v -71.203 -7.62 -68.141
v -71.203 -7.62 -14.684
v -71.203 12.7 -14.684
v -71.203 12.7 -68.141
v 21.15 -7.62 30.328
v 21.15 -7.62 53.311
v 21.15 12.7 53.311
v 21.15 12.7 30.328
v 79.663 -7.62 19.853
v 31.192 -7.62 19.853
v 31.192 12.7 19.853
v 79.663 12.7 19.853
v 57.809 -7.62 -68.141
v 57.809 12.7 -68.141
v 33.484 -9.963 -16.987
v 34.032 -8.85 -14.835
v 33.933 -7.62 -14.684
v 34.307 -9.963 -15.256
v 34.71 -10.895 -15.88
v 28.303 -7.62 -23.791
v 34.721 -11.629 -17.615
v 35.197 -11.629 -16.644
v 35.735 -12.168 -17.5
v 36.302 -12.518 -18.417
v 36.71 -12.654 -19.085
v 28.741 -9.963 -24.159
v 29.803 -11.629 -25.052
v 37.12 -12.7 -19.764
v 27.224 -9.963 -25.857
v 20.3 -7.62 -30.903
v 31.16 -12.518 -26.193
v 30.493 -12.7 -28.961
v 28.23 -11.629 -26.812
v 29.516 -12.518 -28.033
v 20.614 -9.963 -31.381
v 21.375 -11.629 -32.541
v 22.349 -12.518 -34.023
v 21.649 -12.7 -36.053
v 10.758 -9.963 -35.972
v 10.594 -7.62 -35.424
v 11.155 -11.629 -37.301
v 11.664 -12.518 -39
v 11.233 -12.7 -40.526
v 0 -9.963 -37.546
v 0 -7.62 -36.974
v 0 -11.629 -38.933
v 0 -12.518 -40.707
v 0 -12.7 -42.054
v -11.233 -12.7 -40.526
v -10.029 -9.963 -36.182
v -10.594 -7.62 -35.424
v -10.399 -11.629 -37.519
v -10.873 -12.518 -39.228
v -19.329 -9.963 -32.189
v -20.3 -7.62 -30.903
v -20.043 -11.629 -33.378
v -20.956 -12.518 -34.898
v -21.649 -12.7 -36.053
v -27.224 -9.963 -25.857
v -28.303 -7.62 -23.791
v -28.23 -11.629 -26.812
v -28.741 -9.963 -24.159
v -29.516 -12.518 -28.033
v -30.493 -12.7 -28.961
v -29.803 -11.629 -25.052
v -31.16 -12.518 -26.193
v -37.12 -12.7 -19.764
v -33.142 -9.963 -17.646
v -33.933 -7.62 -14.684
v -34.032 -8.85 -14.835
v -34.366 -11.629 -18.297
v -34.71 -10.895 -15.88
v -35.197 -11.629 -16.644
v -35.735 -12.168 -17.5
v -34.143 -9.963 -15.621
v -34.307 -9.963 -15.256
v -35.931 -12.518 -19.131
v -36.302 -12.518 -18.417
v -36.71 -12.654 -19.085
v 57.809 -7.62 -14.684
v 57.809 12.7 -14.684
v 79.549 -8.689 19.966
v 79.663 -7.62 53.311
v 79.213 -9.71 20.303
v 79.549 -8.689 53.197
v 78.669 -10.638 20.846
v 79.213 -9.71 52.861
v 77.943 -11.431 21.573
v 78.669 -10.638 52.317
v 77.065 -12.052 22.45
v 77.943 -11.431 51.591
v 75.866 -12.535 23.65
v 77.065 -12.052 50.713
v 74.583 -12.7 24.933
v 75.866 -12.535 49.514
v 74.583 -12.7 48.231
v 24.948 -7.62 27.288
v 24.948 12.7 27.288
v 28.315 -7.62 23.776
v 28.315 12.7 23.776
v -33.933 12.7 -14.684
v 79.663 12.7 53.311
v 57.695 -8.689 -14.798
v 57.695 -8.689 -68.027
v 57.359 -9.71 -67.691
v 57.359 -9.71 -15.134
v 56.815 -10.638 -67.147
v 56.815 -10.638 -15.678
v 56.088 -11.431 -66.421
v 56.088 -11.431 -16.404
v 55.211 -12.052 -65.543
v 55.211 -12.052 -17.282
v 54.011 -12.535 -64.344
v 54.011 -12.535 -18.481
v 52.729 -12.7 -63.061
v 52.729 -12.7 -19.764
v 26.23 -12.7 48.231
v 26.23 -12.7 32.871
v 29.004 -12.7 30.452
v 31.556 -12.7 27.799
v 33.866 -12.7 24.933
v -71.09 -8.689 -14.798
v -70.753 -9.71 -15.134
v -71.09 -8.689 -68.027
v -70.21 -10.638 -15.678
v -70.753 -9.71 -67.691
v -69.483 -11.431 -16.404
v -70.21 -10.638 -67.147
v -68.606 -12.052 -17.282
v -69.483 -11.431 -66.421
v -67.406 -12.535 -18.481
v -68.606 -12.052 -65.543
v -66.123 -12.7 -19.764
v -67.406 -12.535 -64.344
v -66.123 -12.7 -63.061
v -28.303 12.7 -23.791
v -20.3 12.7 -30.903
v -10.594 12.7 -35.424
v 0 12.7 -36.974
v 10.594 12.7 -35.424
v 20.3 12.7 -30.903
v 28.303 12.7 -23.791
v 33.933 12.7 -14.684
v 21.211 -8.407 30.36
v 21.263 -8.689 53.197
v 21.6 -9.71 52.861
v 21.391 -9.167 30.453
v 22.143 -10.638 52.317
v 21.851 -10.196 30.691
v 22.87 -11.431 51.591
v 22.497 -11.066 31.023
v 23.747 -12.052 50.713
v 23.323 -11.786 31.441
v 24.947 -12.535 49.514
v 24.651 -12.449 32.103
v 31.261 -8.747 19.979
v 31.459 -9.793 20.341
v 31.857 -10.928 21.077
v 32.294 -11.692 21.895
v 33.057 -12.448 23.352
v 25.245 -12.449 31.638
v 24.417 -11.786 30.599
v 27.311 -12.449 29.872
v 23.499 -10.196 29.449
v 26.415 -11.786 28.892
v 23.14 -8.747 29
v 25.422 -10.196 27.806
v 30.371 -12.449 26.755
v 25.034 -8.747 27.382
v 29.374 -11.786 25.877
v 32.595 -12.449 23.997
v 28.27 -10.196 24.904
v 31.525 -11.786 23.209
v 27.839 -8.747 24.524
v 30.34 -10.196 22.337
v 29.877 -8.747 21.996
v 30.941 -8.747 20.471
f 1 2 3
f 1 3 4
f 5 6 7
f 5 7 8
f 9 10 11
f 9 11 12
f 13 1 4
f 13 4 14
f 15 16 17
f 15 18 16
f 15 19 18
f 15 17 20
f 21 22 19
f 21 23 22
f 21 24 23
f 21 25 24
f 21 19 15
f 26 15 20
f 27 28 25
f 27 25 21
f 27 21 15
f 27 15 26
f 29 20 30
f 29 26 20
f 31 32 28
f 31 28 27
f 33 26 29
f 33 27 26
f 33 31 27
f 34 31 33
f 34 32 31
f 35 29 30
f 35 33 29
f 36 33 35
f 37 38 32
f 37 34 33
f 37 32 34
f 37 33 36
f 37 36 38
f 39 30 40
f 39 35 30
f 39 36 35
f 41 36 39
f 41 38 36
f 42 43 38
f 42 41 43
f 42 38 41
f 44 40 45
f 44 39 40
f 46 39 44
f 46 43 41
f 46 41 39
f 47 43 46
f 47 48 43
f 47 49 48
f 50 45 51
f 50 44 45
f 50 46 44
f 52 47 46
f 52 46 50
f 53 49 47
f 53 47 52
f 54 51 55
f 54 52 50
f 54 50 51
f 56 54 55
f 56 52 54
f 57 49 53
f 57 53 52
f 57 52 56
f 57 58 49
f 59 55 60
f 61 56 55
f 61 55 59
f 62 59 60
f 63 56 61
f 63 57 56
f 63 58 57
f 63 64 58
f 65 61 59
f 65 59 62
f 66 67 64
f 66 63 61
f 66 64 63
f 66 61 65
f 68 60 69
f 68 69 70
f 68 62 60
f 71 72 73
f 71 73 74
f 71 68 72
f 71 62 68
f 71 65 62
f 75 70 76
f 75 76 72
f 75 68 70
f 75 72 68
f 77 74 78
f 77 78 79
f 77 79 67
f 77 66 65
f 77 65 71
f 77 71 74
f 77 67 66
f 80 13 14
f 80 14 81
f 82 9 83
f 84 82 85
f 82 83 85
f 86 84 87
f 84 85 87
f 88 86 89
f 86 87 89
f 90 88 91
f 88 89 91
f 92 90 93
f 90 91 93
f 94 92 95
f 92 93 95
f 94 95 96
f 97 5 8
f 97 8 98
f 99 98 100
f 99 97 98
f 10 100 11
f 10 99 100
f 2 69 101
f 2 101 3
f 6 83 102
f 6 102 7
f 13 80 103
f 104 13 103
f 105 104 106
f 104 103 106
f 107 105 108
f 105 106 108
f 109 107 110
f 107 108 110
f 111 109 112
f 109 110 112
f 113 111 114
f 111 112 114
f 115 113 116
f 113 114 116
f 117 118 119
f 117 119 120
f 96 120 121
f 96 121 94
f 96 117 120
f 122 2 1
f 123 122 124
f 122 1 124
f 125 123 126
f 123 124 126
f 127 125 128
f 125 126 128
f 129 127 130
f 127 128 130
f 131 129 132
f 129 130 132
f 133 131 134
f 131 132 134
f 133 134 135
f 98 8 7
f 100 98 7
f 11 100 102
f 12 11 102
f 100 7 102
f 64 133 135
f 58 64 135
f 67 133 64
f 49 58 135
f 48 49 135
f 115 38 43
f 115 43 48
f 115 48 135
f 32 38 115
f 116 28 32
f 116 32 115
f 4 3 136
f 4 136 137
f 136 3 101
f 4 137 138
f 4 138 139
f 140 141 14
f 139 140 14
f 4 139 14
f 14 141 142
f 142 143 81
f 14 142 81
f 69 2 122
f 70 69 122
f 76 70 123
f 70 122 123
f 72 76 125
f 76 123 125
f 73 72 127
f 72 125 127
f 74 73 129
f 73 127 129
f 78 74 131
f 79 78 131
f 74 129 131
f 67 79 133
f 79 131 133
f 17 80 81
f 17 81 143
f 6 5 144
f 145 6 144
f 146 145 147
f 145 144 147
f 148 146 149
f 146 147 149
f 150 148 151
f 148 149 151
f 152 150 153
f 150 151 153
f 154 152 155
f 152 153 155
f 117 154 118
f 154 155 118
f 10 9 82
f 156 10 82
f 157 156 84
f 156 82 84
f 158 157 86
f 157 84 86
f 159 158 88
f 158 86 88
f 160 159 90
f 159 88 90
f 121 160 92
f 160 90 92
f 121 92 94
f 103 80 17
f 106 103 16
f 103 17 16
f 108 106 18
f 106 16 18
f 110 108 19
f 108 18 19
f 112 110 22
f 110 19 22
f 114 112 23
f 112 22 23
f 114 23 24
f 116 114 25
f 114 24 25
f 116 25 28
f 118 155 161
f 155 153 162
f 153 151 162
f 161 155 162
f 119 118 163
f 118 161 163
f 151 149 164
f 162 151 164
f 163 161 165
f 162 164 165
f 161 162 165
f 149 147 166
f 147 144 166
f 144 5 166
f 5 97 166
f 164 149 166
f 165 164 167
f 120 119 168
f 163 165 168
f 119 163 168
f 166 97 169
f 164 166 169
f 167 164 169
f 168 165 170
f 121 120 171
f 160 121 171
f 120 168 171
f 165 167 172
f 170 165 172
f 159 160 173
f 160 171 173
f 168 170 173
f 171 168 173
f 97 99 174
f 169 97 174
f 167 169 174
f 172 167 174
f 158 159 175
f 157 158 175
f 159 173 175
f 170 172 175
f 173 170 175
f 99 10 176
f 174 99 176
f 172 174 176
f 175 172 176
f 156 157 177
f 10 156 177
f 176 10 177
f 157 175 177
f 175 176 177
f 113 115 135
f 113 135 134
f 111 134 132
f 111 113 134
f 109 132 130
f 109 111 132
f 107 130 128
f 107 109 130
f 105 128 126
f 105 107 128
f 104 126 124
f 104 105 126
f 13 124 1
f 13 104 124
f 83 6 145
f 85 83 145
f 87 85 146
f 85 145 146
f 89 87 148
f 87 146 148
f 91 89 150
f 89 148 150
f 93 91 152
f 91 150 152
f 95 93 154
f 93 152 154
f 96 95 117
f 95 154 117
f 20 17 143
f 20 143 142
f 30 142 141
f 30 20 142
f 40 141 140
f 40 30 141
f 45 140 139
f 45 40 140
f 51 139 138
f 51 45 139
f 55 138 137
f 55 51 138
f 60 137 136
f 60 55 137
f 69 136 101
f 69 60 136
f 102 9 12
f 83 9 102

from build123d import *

# Parameters (mm, degrees)
F1_DEPTH = 12.7
F2_R     = 5.08
F2_2_R   = 5.08


with BuildPart() as f1:
    # F0 (on Front) → F1 (new body, symmetric)
    with BuildSketch(Plane.XZ):
        with BuildLine():
            Line((21.1495440453, 53.3111467957), (21.1495440453, 30.3275137133))
            ThreePointArc((21.1495440453, 30.3275137133), (26.6896834856, 25.5875379197), (31.1919489606, 19.852546975))
            Line((31.1919489606, 19.852546975), (79.6632692218, 19.852546975))
            Line((79.6632692218, 19.852546975), (79.6632692218, 53.3111467957))
            Line((79.6632692218, 53.3111467957), (21.1495440453, 53.3111467957))
        make_face()
    extrude(amount=F1_DEPTH, both=True)

    # F2#2
    f2_2_edges = [f1.edges().sort_by_distance(p)[0] for p in [
        (26.689683, -12.7, 25.587538),
        (21.149544, -12.7, 41.81933),
        (55.427609, -12.7, 19.852547),
        (50.406407, -12.7, 53.311147),
        (79.663269, -12.7, 36.581847),
    ]]
    fillet(f2_2_edges, radius=F2_2_R)


with BuildPart() as f1b:
    # F0 (on Front) → F1, piece 2 (new body, symmetric)
    with BuildSketch(Plane.XZ):
        with BuildLine():
            Line((-71.2034627795, -14.683874324), (-71.2034627795, -68.1411400437))
            Line((-71.2034627795, -68.1411400437), (57.8087456524, -68.1411400437))
            Line((57.8087456524, -68.1411400437), (57.8087456524, -14.683874324))
            Line((57.8087456524, -14.683874324), (33.9329505966, -14.683874324))
            ThreePointArc((33.9329505966, -14.683874324), (0, -36.9737920878), (-33.9329505966, -14.683874324))
            Line((-33.9329505966, -14.683874324), (-71.2034627795, -14.683874324))
        make_face()
    extrude(amount=F1_DEPTH, both=True)

    # F2
    f2_edges = [f1b.edges().sort_by_distance(p)[0] for p in [
        (-52.568207, -12.7, -14.683874),
        (0, -12.7, -36.973792),
        (45.870848, -12.7, -14.683874),
        (-71.203463, -12.7, -41.412507),
        (57.808746, -12.7, -41.412507),
        (-6.697359, -12.7, -68.14114),
    ]]
    fillet(f2_edges, radius=F2_R)


solid = Compound([f1.part, f1b.part])
